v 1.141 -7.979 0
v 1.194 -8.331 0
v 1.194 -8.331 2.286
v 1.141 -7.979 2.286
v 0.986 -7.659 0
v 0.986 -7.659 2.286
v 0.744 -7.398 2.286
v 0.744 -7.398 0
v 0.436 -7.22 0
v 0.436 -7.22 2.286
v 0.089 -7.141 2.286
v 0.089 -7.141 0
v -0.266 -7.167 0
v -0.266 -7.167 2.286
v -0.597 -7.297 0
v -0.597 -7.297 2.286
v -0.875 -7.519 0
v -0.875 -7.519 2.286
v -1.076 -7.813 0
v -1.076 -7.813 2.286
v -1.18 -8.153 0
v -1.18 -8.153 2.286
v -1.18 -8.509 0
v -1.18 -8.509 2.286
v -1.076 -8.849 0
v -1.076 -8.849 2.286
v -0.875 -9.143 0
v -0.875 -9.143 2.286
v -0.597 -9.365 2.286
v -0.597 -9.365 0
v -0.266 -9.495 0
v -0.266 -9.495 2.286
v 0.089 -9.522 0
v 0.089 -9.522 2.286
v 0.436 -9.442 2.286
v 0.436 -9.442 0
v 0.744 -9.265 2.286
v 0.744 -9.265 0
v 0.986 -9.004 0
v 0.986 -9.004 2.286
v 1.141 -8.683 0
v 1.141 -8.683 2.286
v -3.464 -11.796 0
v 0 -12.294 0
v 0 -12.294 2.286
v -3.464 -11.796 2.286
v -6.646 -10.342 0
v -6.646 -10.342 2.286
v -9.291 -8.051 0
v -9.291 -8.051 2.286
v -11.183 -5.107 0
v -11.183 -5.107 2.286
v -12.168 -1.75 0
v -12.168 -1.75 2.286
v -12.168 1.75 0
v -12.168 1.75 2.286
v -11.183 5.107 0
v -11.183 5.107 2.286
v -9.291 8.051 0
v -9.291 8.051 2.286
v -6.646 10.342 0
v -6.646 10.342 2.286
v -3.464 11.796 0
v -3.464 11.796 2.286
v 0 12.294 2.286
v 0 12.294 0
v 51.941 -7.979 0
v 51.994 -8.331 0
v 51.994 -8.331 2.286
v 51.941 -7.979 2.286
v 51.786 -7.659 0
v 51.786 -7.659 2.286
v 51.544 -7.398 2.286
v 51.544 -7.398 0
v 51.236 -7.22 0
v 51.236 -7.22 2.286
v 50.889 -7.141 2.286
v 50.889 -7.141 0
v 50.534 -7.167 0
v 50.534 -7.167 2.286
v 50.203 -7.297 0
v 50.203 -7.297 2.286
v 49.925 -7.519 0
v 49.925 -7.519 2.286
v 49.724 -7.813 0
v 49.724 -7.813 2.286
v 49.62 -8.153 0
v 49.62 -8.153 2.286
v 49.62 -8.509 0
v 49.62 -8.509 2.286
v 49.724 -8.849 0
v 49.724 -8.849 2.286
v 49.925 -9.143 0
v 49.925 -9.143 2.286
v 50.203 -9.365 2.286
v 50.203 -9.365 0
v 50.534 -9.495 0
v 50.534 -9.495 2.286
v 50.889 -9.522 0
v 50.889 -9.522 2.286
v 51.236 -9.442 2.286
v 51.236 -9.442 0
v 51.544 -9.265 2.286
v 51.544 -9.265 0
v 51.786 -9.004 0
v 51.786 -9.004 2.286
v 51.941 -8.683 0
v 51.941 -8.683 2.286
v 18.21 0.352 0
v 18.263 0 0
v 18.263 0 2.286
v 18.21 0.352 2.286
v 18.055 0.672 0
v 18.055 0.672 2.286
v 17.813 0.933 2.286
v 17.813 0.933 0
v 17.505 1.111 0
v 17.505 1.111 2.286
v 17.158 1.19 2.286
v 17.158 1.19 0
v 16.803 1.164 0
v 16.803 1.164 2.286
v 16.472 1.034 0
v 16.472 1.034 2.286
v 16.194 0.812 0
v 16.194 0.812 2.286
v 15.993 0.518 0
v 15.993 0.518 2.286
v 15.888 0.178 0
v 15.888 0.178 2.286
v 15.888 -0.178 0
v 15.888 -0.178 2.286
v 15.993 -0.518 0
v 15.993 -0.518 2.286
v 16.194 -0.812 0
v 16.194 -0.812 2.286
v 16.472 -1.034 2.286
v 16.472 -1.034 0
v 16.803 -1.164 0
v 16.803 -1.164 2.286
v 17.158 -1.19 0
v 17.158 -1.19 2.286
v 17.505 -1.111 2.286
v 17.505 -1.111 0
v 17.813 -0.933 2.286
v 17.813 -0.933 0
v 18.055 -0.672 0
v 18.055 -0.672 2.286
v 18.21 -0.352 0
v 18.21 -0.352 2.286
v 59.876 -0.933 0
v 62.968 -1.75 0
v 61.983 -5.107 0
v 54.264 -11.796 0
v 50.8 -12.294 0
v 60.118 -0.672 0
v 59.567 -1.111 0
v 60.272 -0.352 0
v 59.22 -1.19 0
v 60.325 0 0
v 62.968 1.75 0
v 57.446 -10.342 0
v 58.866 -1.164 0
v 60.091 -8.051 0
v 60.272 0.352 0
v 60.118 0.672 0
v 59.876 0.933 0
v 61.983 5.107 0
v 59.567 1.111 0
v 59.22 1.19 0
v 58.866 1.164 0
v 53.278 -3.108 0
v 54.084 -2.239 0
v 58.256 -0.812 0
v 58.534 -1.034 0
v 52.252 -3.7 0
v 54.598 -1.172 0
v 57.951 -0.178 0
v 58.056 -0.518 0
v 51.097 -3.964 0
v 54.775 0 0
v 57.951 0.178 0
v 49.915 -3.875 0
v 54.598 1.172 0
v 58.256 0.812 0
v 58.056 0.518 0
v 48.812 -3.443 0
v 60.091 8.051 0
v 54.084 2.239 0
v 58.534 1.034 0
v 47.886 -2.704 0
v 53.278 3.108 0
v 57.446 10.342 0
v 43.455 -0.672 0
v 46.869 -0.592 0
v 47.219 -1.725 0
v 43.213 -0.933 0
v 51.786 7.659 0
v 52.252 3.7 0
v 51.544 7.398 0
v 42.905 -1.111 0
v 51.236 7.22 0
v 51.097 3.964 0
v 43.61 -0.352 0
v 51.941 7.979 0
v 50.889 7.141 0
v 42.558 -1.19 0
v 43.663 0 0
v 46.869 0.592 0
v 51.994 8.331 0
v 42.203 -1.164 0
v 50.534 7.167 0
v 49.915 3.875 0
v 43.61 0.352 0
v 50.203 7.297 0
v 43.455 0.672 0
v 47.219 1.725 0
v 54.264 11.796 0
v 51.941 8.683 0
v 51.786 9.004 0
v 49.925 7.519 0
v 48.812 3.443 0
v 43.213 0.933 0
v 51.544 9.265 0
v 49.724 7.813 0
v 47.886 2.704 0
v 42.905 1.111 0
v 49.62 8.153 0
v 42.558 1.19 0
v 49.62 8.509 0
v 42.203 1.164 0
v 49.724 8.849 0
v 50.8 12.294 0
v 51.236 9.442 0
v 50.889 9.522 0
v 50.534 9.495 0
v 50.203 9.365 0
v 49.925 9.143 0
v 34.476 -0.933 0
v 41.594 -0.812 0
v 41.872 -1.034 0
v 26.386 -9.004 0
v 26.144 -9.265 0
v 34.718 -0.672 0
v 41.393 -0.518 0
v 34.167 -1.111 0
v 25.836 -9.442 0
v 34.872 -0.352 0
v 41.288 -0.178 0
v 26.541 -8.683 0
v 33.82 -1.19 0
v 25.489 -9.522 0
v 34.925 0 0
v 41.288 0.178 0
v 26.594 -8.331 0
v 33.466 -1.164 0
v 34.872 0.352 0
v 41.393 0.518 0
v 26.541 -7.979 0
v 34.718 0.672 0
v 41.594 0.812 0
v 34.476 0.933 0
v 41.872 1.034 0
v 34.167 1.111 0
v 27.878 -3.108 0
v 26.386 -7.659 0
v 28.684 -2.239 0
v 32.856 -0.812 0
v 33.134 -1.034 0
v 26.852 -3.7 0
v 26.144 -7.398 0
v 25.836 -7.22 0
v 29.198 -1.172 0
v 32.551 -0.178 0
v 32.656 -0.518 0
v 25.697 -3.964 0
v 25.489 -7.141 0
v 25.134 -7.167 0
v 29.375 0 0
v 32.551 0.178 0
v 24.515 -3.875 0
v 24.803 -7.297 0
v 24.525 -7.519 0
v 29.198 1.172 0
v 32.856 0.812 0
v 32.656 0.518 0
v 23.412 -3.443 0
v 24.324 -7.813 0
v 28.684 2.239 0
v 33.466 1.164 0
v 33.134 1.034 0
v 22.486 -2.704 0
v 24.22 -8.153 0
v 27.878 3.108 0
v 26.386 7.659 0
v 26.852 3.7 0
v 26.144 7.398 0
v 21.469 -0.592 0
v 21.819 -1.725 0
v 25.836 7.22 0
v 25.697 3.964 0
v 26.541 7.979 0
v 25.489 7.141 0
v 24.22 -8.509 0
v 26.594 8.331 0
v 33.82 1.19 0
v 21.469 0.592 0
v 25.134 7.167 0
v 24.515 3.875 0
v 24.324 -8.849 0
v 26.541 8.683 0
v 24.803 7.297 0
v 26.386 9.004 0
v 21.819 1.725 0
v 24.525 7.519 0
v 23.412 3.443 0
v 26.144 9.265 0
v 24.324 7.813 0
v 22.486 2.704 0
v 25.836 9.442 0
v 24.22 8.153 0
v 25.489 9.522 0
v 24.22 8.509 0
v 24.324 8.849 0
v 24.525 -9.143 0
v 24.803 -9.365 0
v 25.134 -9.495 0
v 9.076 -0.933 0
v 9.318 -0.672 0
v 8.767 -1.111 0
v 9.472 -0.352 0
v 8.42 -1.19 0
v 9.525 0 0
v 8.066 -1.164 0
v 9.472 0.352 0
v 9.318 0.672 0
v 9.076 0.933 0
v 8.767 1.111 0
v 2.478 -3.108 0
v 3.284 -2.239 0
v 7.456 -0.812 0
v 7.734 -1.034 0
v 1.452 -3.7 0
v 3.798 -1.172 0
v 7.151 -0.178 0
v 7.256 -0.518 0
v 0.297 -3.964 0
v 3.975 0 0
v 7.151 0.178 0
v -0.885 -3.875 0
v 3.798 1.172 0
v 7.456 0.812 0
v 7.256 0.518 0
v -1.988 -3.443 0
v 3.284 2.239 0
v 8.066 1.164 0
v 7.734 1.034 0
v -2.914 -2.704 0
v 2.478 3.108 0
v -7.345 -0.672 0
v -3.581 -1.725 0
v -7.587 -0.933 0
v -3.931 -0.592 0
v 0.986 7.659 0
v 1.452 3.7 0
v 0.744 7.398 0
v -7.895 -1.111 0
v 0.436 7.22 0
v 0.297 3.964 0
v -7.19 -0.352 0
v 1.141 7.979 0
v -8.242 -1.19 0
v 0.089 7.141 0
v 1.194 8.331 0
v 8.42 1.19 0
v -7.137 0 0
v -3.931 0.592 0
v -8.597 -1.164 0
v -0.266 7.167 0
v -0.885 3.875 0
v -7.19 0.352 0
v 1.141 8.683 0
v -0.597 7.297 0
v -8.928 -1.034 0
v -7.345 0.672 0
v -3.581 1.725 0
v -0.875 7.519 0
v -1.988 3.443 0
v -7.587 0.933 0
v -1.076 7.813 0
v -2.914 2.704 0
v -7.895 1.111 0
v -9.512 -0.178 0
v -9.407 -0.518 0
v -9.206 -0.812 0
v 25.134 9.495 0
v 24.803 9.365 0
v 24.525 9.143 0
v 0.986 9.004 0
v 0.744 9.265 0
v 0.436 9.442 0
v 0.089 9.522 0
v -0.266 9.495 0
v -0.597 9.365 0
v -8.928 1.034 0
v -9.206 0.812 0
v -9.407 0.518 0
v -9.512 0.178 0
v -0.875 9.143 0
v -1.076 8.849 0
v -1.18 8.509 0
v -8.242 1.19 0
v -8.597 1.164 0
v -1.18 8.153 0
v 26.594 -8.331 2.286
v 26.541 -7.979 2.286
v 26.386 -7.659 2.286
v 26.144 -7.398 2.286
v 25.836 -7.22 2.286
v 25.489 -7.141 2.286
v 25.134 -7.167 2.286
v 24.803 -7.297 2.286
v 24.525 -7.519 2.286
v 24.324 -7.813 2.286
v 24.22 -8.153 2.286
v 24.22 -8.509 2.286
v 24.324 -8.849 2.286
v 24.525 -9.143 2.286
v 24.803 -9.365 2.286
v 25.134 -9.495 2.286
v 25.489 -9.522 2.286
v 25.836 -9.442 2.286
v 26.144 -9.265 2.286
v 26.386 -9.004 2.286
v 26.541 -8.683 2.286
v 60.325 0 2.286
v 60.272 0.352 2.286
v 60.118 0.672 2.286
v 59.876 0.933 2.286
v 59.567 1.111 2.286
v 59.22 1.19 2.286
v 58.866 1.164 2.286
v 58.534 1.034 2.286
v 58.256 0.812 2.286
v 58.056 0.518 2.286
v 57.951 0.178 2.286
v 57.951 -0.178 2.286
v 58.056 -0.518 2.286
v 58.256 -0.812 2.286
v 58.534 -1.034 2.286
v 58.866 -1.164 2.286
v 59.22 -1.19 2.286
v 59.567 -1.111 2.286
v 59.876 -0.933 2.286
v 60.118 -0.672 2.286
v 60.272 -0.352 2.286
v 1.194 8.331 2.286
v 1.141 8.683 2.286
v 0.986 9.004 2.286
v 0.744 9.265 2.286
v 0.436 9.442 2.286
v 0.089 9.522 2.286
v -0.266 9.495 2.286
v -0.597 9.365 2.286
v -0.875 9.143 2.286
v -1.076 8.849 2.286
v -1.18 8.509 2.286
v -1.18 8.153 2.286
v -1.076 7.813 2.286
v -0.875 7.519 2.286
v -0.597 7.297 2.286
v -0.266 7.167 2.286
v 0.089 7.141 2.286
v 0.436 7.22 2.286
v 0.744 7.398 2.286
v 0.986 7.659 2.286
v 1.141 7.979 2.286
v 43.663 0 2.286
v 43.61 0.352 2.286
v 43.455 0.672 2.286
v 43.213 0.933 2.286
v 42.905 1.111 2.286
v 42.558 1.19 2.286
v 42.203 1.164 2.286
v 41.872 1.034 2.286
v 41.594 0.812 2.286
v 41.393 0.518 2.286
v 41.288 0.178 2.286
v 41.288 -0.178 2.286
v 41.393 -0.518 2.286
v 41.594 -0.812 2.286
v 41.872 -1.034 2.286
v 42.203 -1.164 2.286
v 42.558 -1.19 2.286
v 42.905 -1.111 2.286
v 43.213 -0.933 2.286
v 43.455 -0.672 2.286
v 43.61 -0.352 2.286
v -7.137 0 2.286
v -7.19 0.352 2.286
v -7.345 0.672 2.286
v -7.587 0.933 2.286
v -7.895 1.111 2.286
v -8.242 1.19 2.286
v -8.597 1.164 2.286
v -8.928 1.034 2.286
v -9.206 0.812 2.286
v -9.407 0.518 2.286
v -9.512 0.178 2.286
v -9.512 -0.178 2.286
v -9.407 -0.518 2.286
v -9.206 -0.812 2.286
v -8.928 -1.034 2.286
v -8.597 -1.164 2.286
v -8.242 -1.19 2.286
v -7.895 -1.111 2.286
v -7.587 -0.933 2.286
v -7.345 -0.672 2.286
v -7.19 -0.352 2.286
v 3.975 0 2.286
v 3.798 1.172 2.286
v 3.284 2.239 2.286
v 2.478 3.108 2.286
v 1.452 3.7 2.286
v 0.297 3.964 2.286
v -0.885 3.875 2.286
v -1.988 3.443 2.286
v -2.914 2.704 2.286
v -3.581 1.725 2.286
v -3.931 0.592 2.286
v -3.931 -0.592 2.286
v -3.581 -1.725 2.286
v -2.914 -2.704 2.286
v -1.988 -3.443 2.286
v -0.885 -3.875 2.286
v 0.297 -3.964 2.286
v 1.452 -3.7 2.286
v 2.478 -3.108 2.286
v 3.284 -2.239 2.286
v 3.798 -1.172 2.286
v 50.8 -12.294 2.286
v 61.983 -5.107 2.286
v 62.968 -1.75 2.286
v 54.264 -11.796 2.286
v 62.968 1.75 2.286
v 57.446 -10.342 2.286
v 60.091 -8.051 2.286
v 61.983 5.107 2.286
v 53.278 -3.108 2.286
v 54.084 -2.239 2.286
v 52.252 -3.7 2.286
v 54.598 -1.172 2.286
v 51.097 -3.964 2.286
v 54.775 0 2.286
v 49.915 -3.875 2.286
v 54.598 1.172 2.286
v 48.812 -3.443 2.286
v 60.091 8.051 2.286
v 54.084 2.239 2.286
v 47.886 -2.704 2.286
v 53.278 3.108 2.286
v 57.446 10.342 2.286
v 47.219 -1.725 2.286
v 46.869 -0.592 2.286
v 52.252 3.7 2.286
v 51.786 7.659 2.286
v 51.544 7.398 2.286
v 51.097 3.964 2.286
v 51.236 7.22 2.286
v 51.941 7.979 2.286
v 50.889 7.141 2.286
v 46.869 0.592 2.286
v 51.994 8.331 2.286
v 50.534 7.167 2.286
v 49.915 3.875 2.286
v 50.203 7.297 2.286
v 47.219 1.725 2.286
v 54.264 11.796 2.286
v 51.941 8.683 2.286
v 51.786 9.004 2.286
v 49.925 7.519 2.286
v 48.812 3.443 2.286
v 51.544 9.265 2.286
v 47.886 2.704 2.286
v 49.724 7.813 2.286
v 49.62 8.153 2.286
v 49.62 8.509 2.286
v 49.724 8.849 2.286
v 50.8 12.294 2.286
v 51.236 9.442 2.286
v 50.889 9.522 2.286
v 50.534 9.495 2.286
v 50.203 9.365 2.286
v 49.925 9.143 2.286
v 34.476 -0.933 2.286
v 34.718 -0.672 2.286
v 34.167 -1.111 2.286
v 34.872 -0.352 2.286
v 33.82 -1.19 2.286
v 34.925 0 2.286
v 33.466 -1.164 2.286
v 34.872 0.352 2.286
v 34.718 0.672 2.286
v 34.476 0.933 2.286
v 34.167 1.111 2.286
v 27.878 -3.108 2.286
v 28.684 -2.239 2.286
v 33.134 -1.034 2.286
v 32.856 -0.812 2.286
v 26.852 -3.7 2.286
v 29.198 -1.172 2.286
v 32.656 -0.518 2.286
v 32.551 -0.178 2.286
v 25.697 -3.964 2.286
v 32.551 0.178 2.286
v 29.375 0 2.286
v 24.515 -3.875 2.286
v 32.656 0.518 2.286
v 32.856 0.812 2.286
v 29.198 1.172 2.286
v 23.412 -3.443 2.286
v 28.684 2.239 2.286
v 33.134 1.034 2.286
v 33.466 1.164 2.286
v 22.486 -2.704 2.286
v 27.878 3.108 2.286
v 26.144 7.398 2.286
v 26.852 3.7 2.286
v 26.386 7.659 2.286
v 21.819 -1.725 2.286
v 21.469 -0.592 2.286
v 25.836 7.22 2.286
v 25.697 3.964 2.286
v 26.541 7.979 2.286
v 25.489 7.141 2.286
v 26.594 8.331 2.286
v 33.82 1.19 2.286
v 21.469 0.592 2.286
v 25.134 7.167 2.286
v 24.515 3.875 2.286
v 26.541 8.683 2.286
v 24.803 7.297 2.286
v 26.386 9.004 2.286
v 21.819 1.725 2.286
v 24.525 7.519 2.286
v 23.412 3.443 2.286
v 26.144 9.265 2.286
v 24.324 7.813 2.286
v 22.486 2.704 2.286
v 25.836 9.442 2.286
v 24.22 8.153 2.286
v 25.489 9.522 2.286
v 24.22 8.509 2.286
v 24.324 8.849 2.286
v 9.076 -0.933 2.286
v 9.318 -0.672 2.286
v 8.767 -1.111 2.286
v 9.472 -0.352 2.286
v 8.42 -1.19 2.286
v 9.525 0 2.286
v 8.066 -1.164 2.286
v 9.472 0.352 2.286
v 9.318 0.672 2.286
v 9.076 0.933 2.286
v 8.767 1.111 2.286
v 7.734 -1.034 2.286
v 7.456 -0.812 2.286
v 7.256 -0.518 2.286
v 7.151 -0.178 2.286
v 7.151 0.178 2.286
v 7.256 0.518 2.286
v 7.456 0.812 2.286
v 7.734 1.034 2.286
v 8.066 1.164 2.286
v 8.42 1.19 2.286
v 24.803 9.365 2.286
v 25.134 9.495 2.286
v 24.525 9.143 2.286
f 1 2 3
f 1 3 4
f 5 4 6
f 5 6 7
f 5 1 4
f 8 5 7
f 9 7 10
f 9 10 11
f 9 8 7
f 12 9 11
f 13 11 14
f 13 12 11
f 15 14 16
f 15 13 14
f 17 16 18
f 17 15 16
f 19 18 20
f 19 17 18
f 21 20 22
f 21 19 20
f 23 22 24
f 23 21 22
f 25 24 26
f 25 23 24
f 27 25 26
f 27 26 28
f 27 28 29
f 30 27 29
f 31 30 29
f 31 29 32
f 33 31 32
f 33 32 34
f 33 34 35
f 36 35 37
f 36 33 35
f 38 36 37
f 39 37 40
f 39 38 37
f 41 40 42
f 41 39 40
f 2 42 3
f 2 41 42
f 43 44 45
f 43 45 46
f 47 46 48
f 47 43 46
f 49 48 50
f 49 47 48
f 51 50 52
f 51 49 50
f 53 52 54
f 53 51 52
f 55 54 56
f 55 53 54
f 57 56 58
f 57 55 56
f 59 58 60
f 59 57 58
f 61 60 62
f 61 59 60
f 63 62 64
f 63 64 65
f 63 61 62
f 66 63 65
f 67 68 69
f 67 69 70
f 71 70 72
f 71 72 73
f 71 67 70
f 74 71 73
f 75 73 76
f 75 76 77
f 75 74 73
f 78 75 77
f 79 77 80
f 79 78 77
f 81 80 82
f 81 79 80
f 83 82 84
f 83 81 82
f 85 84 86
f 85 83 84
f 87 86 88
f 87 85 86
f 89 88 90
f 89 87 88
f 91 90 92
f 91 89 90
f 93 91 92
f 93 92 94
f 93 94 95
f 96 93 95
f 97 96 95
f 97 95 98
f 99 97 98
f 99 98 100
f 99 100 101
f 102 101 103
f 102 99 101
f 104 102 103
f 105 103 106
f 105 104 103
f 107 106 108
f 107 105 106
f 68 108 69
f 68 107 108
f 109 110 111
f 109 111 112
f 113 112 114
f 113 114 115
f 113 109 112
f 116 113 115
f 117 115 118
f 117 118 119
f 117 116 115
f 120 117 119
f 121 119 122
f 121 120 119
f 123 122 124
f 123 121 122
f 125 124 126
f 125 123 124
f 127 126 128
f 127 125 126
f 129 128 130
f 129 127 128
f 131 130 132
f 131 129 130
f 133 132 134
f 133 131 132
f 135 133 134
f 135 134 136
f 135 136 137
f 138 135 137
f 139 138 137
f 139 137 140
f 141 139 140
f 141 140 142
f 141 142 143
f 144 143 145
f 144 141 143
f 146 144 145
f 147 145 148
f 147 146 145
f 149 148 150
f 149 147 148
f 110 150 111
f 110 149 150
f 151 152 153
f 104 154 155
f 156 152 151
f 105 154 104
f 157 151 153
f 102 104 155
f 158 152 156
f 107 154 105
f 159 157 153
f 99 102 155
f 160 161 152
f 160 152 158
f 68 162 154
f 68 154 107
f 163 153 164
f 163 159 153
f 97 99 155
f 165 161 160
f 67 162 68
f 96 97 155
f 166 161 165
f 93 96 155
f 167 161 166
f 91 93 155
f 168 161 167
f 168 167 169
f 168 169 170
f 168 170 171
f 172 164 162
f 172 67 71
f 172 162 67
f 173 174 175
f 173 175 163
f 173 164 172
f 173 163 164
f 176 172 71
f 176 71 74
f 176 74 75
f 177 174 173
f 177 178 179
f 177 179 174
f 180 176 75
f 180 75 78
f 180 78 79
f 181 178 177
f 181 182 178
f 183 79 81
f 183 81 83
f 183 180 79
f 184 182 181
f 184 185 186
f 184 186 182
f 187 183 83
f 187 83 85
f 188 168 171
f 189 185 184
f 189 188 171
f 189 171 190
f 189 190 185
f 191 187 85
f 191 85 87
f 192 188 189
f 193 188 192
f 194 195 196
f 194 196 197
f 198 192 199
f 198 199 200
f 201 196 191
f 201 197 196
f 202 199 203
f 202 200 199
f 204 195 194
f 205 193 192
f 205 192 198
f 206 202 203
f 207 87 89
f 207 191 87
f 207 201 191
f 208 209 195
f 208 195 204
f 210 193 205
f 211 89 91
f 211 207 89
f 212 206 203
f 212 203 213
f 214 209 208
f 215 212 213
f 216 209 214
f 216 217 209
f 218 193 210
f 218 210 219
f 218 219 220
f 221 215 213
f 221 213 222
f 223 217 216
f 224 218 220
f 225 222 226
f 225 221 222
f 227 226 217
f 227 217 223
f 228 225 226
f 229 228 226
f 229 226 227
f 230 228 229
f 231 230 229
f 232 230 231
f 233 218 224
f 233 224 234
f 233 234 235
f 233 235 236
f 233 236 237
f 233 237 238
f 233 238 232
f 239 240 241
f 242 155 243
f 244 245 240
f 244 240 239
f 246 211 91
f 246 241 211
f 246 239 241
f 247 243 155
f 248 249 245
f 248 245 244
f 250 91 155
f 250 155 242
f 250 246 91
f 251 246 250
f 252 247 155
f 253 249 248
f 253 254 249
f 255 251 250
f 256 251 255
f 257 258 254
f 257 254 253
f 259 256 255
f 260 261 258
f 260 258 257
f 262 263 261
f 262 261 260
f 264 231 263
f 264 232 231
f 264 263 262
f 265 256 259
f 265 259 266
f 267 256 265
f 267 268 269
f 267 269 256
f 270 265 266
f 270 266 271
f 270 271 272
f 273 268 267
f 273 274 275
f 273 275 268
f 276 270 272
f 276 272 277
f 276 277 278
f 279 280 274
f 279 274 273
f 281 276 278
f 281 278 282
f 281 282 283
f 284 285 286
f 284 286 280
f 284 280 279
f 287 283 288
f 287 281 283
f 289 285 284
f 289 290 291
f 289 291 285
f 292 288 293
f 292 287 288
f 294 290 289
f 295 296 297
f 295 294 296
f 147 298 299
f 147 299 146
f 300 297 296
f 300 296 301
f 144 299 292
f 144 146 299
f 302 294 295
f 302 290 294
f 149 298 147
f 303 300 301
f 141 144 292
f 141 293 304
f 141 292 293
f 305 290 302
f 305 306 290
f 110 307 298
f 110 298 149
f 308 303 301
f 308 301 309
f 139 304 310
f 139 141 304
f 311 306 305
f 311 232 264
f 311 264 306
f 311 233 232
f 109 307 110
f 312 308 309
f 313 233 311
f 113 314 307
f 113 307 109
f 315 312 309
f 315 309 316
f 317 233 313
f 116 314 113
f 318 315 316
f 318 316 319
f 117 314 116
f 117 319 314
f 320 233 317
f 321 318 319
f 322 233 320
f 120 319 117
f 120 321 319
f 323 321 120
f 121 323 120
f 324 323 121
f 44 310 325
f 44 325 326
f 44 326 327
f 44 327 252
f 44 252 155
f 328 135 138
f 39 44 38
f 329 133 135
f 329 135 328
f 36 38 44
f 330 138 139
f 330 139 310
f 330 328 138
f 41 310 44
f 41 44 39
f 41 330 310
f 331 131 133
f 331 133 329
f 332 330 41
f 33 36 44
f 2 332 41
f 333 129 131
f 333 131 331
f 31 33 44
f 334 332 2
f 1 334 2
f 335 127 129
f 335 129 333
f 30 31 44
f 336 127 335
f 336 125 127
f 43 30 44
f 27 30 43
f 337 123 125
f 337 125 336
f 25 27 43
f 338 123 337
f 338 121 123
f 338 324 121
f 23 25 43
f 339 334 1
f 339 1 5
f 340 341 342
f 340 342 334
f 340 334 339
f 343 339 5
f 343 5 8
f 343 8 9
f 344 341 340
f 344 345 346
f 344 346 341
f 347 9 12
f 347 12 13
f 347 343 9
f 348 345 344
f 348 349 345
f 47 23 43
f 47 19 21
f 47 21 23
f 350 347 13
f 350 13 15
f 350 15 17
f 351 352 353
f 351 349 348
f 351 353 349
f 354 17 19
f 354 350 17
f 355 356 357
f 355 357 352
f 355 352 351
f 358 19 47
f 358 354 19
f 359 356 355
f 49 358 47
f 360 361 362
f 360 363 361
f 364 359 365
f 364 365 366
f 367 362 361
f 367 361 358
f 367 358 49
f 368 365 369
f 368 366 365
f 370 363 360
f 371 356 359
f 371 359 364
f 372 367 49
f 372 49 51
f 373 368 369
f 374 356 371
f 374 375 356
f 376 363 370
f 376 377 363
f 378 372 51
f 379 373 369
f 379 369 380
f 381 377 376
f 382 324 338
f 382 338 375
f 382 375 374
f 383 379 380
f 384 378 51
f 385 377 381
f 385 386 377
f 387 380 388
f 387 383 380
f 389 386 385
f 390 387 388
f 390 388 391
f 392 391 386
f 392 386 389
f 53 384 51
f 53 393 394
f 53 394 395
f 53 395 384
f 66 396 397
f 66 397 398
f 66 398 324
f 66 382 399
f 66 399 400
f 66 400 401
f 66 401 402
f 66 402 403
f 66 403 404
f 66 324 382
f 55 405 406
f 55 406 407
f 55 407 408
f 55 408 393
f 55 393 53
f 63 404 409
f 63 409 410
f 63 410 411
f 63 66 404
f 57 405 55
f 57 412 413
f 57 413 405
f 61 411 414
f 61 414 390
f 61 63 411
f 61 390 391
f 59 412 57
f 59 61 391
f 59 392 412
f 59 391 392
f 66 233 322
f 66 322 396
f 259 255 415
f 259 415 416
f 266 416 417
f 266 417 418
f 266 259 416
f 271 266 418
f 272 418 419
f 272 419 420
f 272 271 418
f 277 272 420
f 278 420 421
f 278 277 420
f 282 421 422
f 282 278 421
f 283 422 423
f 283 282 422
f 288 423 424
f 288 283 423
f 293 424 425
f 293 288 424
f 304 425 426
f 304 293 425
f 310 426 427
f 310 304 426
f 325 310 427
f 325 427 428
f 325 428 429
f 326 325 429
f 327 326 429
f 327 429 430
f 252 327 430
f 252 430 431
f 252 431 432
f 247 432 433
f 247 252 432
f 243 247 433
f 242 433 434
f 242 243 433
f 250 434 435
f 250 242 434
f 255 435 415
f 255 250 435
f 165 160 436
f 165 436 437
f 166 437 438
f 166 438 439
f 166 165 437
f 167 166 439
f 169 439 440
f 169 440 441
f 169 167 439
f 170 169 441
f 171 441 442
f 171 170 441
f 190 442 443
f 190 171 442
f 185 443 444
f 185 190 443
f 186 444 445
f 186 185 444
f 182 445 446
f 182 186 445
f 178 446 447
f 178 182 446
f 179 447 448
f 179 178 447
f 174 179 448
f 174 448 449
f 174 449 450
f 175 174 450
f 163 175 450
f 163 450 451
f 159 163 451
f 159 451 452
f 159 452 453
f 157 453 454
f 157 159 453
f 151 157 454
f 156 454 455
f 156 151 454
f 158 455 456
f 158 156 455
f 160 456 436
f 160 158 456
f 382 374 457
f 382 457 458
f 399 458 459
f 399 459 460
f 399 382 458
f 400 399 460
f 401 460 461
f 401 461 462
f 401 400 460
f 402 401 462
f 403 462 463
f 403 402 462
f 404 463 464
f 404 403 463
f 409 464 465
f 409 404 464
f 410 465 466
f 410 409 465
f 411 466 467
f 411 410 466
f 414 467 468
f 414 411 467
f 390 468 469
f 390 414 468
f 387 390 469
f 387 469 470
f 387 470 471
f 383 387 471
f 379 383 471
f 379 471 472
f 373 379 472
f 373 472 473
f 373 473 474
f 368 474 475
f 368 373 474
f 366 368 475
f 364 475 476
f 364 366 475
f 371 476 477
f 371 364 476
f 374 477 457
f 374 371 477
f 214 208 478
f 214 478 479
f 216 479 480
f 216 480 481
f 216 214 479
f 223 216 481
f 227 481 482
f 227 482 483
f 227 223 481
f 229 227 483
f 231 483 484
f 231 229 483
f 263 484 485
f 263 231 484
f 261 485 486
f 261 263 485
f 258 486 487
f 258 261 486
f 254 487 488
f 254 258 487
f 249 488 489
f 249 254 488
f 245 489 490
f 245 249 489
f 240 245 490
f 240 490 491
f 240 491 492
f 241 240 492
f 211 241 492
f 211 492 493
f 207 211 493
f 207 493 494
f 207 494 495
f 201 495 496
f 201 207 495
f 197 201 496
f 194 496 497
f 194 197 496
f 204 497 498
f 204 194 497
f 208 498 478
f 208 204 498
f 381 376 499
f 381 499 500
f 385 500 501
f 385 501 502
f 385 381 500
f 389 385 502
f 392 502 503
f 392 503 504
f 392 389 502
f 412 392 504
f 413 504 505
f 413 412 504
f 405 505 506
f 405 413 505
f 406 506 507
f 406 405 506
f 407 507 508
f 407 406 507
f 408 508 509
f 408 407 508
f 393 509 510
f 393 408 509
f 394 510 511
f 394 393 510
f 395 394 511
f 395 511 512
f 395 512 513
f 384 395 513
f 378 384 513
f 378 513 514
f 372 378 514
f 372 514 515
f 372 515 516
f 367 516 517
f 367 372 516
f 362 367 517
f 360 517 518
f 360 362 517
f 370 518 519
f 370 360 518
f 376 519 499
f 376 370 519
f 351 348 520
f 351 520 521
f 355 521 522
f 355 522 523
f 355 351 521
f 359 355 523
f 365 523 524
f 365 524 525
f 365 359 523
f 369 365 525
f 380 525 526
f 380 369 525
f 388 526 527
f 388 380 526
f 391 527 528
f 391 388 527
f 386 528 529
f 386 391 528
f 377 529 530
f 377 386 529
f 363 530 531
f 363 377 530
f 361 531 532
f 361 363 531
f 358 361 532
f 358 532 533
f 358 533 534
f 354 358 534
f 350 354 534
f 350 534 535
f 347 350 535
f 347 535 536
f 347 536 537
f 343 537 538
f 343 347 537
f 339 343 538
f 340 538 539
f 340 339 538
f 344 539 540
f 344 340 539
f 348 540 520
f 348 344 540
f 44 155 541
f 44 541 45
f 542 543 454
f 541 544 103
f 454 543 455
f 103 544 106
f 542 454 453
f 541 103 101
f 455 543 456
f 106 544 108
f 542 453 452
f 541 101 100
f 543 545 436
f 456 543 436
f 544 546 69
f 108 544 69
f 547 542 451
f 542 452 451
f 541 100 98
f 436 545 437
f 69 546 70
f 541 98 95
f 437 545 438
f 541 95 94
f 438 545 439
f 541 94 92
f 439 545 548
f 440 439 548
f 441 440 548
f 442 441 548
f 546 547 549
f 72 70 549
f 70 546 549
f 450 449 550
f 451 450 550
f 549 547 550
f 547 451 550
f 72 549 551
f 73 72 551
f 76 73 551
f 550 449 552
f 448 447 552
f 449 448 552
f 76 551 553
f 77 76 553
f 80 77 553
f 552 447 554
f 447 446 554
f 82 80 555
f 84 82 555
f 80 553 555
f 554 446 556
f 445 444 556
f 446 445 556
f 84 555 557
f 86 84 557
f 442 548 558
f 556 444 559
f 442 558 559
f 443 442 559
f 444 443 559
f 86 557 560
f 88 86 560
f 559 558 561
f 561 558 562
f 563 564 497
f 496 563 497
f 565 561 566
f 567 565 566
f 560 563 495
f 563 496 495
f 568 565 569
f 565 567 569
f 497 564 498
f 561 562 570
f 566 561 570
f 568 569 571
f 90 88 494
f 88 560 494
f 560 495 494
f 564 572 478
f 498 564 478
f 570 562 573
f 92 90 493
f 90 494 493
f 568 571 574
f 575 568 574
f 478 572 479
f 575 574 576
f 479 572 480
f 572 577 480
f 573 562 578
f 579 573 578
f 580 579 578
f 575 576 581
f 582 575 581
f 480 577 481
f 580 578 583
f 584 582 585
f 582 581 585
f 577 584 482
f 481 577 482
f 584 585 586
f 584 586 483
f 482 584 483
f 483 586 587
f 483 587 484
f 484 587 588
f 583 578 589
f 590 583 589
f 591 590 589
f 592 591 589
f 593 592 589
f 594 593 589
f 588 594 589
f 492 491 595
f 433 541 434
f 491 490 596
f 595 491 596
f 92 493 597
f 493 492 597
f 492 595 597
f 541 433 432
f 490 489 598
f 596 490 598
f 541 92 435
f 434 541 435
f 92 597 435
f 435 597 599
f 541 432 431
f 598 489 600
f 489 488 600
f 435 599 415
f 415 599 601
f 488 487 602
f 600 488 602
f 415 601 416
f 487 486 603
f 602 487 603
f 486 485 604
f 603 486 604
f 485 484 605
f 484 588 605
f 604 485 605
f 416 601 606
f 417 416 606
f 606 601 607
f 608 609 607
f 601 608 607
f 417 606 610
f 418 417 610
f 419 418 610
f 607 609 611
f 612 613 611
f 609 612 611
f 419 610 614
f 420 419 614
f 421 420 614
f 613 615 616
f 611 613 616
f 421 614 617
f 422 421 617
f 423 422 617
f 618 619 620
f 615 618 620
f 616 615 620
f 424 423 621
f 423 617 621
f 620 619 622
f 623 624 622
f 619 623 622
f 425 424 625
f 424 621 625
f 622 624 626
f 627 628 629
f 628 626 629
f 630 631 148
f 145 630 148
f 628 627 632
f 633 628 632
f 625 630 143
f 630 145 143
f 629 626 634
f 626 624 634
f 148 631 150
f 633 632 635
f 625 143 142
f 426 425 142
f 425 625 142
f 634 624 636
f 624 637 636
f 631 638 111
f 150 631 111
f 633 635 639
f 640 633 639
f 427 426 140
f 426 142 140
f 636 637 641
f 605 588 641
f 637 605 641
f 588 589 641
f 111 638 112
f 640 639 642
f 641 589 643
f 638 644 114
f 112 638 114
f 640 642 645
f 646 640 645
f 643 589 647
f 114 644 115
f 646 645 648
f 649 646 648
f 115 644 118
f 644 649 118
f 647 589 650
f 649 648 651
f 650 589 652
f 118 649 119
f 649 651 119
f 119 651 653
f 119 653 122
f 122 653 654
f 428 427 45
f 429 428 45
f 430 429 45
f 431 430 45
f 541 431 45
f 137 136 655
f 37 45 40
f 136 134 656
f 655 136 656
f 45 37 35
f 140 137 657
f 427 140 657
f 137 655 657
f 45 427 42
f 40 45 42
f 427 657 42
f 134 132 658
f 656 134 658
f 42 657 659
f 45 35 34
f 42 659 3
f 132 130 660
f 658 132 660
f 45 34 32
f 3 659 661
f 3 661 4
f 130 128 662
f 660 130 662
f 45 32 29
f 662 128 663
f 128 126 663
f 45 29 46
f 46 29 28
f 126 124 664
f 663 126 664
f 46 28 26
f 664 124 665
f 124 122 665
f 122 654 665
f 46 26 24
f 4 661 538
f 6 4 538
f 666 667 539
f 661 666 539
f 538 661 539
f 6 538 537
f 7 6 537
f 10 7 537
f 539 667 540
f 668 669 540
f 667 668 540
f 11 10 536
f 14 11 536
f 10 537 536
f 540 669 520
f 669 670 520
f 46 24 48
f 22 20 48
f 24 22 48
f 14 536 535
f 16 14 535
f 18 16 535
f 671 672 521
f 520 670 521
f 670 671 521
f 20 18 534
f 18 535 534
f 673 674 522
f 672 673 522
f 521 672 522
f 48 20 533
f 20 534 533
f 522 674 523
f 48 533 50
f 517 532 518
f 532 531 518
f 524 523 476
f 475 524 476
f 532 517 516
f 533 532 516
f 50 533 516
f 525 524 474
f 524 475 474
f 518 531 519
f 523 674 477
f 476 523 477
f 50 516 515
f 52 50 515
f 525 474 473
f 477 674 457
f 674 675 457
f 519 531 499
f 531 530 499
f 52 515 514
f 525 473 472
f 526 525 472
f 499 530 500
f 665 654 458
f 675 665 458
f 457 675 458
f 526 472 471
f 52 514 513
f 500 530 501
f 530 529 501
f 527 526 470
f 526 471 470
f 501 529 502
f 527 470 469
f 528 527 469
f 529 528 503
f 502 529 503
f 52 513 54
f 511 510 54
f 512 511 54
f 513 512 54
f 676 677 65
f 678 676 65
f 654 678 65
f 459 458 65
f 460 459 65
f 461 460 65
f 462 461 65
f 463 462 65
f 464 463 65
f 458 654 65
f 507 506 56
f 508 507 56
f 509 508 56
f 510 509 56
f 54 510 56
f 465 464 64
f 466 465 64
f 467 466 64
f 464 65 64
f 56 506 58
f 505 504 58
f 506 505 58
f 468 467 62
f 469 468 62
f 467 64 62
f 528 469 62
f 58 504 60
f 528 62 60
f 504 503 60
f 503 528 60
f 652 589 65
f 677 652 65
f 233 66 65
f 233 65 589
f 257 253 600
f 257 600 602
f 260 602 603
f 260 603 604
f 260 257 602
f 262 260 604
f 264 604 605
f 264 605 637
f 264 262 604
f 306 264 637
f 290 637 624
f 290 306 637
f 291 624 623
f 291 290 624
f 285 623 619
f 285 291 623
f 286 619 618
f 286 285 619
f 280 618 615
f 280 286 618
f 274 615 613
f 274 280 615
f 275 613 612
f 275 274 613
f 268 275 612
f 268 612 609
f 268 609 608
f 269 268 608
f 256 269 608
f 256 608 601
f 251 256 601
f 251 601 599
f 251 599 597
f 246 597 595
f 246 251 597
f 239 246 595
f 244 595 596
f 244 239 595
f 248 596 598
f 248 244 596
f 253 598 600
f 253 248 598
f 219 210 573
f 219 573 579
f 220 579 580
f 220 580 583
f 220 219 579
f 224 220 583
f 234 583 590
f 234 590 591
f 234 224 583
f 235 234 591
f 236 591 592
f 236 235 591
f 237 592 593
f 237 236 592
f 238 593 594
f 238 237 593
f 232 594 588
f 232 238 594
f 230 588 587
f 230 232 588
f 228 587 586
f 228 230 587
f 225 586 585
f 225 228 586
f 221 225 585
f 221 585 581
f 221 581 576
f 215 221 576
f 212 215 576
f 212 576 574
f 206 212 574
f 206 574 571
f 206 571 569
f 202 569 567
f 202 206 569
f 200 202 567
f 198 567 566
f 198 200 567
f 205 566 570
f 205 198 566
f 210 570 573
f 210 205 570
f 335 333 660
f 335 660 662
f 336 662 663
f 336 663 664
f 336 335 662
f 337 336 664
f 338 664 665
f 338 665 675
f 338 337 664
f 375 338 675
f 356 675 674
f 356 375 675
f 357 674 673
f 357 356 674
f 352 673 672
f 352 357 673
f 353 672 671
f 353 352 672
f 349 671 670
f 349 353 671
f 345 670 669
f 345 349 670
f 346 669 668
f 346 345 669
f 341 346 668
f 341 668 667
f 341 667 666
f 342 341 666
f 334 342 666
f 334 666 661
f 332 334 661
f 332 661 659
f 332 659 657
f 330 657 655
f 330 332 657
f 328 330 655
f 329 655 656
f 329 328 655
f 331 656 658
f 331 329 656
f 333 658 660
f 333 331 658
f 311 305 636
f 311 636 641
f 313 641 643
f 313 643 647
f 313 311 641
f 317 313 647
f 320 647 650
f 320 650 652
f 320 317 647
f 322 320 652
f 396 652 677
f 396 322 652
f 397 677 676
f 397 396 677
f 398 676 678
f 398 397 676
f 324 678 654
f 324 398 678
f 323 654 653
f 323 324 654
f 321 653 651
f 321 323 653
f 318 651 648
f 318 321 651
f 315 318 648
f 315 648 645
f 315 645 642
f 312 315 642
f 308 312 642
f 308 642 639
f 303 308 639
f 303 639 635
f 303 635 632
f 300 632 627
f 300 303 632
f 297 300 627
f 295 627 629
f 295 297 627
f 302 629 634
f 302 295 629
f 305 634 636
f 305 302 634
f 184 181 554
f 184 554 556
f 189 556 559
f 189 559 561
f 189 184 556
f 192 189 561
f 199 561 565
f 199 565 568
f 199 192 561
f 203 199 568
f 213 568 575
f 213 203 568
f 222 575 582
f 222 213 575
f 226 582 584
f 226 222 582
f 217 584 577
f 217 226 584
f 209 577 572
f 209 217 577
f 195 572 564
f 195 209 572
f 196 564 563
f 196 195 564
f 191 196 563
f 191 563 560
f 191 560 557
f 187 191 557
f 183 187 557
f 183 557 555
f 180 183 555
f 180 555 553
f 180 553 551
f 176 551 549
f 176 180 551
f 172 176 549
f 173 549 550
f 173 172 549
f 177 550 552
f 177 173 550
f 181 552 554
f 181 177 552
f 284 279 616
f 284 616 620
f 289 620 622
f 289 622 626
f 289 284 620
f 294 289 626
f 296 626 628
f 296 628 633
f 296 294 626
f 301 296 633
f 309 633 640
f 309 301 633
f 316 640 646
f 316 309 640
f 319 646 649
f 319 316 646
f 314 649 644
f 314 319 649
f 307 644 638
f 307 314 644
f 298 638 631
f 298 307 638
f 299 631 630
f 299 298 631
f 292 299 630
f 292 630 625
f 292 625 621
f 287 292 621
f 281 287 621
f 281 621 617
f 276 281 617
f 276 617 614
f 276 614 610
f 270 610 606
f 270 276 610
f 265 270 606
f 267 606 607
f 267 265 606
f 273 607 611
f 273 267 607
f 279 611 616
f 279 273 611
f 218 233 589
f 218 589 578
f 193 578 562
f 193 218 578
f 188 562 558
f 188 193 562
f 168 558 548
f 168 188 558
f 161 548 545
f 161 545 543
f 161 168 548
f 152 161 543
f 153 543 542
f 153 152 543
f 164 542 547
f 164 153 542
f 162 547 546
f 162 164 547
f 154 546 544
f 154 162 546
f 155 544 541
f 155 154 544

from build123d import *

# Parameters (mm, degrees)
SKETCH1_R      = 3.9751
SKETCH1_R_2    = 1.1938
EXTRUDE1_DEPTH = 2.286


with BuildPart() as part:
    # Sketch1 → Extrude1 (new body)
    with BuildSketch(Plane.XY):
        with BuildLine():
            Line((0, 12.2936), (50.8, 12.2936))
            ThreePointArc((50.8, 12.2936), (63.0936, 0), (50.8, -12.2936))
            Line((50.8, -12.2936), (0, -12.2936))
            ThreePointArc((0, -12.2936), (-12.2936, 0), (0, 12.2936))
        make_face()
        Circle(SKETCH1_R, mode=Mode.SUBTRACT)
        with Locations((0, 8.3312)):
            Circle(SKETCH1_R_2, mode=Mode.SUBTRACT)
        with Locations((8.3312, 0)):
            Circle(SKETCH1_R_2, mode=Mode.SUBTRACT)
        with Locations((0, -8.3312)):
            Circle(SKETCH1_R_2, mode=Mode.SUBTRACT)
        with Locations((-8.3312, 0)):
            Circle(SKETCH1_R_2, mode=Mode.SUBTRACT)
        with Locations((17.0688, 0)):
            Circle(SKETCH1_R_2, mode=Mode.SUBTRACT)
        with Locations((33.7312, 0)):
            Circle(SKETCH1_R_2, mode=Mode.SUBTRACT)
        with Locations((25.4, -8.3312)):
            Circle(SKETCH1_R_2, mode=Mode.SUBTRACT)
        with Locations((25.4, 0)):
            Circle(SKETCH1_R, mode=Mode.SUBTRACT)
        with Locations((25.4, 8.3312)):
            Circle(SKETCH1_R_2, mode=Mode.SUBTRACT)
        with Locations((42.4688, 0)):
            Circle(SKETCH1_R_2, mode=Mode.SUBTRACT)
        with Locations((50.8, -8.3312)):
            Circle(SKETCH1_R_2, mode=Mode.SUBTRACT)
        with Locations((59.1312, 0)):
            Circle(SKETCH1_R_2, mode=Mode.SUBTRACT)
        with Locations((50.8, 8.3312)):
            Circle(SKETCH1_R_2, mode=Mode.SUBTRACT)
        with Locations((50.8, 0)):
            Circle(SKETCH1_R, mode=Mode.SUBTRACT)
    extrude(amount=EXTRUDE1_DEPTH)


solid = part.part
